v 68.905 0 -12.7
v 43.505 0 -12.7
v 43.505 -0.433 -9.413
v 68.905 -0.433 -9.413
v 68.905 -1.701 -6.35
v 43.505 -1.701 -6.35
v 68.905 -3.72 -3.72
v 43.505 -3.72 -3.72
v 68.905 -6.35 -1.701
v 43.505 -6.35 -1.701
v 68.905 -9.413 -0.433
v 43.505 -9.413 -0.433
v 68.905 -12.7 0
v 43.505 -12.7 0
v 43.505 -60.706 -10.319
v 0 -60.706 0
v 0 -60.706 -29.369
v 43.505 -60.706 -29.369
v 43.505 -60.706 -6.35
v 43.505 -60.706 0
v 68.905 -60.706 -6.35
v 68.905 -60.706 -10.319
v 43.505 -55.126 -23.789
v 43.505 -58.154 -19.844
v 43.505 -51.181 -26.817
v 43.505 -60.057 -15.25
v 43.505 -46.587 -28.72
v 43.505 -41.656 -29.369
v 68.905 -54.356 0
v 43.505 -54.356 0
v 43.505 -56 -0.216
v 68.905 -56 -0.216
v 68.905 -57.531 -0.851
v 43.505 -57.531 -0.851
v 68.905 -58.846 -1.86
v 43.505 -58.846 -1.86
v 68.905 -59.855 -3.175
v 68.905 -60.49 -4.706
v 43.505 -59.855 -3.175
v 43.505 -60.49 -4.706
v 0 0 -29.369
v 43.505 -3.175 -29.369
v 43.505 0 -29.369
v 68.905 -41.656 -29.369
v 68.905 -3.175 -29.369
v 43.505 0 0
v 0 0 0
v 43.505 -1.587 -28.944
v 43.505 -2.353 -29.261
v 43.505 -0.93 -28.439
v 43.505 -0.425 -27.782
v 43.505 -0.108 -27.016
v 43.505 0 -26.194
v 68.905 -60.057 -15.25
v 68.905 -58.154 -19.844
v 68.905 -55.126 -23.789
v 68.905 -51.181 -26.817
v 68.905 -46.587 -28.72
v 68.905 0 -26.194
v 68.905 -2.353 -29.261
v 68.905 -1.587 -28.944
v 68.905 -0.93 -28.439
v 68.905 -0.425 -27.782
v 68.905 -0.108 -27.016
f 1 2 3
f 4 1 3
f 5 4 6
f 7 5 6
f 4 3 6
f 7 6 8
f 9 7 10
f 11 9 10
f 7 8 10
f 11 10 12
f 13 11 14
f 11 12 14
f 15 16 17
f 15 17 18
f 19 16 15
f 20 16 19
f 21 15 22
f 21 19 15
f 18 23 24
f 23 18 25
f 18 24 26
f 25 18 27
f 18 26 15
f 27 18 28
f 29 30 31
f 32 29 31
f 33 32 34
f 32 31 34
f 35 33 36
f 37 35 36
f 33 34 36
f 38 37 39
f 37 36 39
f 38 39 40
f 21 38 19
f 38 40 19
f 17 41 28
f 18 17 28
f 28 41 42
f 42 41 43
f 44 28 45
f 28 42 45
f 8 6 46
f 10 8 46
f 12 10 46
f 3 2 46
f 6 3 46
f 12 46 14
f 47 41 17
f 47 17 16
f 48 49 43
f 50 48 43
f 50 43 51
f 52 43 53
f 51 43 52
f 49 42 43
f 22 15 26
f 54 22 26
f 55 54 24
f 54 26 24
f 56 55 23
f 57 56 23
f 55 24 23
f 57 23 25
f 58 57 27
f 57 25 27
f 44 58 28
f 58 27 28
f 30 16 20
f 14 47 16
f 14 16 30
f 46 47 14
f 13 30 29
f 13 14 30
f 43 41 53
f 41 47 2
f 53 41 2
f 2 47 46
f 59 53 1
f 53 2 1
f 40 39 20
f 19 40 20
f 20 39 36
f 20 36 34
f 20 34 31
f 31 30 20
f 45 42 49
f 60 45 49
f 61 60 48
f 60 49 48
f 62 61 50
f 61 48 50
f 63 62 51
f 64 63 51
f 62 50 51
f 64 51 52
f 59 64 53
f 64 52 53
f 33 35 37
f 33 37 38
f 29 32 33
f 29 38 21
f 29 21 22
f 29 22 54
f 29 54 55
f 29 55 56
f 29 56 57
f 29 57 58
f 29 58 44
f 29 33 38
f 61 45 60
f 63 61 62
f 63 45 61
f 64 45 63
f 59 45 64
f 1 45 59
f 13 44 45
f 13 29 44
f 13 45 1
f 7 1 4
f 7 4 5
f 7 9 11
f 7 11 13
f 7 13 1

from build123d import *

# Parameters (mm, degrees)
F0_W     = 43.5045808554
F0_H     = 29.3690226972
F1_DEPTH = 60.706
F3_DEPTH = 25.4


with BuildPart() as f1:
    # F0 (on Front) → F1 (new body)
    with BuildSketch(Plane.XZ):
        with Locations((21.7522904277, -14.6845113486)):
            Rectangle(F0_W, F0_H)
    extrude(amount=F1_DEPTH)

    # F2 (on face) → F3 (join)
    with BuildSketch(Plane.YZ.offset(43.5045808554)):
        with BuildLine():
            ThreePointArc((-3.175, -29.3690226972), (-0.9299359697, -28.4390867275), (0, -26.1940226972))
            Line((0, -26.1940226972), (0, -12.7))
            ThreePointArc((0, -12.7), (-3.7197438789, -3.7197438789), (-12.7, 0))
            Line((-12.7, 0), (-54.356, 0))
            ThreePointArc((-54.356, 0), (-58.8461280605, -1.8598719395), (-60.706, -6.35))
            Line((-60.706, -6.35), (-60.706, -10.3190226972))
            ThreePointArc((-60.706, -10.3190226972), (-55.1263841816, -23.7894068788), (-41.656, -29.3690226972))
            Line((-41.656, -29.3690226972), (-3.175, -29.3690226972))
        make_face()
    extrude(amount=F3_DEPTH)


solid = f1.part
